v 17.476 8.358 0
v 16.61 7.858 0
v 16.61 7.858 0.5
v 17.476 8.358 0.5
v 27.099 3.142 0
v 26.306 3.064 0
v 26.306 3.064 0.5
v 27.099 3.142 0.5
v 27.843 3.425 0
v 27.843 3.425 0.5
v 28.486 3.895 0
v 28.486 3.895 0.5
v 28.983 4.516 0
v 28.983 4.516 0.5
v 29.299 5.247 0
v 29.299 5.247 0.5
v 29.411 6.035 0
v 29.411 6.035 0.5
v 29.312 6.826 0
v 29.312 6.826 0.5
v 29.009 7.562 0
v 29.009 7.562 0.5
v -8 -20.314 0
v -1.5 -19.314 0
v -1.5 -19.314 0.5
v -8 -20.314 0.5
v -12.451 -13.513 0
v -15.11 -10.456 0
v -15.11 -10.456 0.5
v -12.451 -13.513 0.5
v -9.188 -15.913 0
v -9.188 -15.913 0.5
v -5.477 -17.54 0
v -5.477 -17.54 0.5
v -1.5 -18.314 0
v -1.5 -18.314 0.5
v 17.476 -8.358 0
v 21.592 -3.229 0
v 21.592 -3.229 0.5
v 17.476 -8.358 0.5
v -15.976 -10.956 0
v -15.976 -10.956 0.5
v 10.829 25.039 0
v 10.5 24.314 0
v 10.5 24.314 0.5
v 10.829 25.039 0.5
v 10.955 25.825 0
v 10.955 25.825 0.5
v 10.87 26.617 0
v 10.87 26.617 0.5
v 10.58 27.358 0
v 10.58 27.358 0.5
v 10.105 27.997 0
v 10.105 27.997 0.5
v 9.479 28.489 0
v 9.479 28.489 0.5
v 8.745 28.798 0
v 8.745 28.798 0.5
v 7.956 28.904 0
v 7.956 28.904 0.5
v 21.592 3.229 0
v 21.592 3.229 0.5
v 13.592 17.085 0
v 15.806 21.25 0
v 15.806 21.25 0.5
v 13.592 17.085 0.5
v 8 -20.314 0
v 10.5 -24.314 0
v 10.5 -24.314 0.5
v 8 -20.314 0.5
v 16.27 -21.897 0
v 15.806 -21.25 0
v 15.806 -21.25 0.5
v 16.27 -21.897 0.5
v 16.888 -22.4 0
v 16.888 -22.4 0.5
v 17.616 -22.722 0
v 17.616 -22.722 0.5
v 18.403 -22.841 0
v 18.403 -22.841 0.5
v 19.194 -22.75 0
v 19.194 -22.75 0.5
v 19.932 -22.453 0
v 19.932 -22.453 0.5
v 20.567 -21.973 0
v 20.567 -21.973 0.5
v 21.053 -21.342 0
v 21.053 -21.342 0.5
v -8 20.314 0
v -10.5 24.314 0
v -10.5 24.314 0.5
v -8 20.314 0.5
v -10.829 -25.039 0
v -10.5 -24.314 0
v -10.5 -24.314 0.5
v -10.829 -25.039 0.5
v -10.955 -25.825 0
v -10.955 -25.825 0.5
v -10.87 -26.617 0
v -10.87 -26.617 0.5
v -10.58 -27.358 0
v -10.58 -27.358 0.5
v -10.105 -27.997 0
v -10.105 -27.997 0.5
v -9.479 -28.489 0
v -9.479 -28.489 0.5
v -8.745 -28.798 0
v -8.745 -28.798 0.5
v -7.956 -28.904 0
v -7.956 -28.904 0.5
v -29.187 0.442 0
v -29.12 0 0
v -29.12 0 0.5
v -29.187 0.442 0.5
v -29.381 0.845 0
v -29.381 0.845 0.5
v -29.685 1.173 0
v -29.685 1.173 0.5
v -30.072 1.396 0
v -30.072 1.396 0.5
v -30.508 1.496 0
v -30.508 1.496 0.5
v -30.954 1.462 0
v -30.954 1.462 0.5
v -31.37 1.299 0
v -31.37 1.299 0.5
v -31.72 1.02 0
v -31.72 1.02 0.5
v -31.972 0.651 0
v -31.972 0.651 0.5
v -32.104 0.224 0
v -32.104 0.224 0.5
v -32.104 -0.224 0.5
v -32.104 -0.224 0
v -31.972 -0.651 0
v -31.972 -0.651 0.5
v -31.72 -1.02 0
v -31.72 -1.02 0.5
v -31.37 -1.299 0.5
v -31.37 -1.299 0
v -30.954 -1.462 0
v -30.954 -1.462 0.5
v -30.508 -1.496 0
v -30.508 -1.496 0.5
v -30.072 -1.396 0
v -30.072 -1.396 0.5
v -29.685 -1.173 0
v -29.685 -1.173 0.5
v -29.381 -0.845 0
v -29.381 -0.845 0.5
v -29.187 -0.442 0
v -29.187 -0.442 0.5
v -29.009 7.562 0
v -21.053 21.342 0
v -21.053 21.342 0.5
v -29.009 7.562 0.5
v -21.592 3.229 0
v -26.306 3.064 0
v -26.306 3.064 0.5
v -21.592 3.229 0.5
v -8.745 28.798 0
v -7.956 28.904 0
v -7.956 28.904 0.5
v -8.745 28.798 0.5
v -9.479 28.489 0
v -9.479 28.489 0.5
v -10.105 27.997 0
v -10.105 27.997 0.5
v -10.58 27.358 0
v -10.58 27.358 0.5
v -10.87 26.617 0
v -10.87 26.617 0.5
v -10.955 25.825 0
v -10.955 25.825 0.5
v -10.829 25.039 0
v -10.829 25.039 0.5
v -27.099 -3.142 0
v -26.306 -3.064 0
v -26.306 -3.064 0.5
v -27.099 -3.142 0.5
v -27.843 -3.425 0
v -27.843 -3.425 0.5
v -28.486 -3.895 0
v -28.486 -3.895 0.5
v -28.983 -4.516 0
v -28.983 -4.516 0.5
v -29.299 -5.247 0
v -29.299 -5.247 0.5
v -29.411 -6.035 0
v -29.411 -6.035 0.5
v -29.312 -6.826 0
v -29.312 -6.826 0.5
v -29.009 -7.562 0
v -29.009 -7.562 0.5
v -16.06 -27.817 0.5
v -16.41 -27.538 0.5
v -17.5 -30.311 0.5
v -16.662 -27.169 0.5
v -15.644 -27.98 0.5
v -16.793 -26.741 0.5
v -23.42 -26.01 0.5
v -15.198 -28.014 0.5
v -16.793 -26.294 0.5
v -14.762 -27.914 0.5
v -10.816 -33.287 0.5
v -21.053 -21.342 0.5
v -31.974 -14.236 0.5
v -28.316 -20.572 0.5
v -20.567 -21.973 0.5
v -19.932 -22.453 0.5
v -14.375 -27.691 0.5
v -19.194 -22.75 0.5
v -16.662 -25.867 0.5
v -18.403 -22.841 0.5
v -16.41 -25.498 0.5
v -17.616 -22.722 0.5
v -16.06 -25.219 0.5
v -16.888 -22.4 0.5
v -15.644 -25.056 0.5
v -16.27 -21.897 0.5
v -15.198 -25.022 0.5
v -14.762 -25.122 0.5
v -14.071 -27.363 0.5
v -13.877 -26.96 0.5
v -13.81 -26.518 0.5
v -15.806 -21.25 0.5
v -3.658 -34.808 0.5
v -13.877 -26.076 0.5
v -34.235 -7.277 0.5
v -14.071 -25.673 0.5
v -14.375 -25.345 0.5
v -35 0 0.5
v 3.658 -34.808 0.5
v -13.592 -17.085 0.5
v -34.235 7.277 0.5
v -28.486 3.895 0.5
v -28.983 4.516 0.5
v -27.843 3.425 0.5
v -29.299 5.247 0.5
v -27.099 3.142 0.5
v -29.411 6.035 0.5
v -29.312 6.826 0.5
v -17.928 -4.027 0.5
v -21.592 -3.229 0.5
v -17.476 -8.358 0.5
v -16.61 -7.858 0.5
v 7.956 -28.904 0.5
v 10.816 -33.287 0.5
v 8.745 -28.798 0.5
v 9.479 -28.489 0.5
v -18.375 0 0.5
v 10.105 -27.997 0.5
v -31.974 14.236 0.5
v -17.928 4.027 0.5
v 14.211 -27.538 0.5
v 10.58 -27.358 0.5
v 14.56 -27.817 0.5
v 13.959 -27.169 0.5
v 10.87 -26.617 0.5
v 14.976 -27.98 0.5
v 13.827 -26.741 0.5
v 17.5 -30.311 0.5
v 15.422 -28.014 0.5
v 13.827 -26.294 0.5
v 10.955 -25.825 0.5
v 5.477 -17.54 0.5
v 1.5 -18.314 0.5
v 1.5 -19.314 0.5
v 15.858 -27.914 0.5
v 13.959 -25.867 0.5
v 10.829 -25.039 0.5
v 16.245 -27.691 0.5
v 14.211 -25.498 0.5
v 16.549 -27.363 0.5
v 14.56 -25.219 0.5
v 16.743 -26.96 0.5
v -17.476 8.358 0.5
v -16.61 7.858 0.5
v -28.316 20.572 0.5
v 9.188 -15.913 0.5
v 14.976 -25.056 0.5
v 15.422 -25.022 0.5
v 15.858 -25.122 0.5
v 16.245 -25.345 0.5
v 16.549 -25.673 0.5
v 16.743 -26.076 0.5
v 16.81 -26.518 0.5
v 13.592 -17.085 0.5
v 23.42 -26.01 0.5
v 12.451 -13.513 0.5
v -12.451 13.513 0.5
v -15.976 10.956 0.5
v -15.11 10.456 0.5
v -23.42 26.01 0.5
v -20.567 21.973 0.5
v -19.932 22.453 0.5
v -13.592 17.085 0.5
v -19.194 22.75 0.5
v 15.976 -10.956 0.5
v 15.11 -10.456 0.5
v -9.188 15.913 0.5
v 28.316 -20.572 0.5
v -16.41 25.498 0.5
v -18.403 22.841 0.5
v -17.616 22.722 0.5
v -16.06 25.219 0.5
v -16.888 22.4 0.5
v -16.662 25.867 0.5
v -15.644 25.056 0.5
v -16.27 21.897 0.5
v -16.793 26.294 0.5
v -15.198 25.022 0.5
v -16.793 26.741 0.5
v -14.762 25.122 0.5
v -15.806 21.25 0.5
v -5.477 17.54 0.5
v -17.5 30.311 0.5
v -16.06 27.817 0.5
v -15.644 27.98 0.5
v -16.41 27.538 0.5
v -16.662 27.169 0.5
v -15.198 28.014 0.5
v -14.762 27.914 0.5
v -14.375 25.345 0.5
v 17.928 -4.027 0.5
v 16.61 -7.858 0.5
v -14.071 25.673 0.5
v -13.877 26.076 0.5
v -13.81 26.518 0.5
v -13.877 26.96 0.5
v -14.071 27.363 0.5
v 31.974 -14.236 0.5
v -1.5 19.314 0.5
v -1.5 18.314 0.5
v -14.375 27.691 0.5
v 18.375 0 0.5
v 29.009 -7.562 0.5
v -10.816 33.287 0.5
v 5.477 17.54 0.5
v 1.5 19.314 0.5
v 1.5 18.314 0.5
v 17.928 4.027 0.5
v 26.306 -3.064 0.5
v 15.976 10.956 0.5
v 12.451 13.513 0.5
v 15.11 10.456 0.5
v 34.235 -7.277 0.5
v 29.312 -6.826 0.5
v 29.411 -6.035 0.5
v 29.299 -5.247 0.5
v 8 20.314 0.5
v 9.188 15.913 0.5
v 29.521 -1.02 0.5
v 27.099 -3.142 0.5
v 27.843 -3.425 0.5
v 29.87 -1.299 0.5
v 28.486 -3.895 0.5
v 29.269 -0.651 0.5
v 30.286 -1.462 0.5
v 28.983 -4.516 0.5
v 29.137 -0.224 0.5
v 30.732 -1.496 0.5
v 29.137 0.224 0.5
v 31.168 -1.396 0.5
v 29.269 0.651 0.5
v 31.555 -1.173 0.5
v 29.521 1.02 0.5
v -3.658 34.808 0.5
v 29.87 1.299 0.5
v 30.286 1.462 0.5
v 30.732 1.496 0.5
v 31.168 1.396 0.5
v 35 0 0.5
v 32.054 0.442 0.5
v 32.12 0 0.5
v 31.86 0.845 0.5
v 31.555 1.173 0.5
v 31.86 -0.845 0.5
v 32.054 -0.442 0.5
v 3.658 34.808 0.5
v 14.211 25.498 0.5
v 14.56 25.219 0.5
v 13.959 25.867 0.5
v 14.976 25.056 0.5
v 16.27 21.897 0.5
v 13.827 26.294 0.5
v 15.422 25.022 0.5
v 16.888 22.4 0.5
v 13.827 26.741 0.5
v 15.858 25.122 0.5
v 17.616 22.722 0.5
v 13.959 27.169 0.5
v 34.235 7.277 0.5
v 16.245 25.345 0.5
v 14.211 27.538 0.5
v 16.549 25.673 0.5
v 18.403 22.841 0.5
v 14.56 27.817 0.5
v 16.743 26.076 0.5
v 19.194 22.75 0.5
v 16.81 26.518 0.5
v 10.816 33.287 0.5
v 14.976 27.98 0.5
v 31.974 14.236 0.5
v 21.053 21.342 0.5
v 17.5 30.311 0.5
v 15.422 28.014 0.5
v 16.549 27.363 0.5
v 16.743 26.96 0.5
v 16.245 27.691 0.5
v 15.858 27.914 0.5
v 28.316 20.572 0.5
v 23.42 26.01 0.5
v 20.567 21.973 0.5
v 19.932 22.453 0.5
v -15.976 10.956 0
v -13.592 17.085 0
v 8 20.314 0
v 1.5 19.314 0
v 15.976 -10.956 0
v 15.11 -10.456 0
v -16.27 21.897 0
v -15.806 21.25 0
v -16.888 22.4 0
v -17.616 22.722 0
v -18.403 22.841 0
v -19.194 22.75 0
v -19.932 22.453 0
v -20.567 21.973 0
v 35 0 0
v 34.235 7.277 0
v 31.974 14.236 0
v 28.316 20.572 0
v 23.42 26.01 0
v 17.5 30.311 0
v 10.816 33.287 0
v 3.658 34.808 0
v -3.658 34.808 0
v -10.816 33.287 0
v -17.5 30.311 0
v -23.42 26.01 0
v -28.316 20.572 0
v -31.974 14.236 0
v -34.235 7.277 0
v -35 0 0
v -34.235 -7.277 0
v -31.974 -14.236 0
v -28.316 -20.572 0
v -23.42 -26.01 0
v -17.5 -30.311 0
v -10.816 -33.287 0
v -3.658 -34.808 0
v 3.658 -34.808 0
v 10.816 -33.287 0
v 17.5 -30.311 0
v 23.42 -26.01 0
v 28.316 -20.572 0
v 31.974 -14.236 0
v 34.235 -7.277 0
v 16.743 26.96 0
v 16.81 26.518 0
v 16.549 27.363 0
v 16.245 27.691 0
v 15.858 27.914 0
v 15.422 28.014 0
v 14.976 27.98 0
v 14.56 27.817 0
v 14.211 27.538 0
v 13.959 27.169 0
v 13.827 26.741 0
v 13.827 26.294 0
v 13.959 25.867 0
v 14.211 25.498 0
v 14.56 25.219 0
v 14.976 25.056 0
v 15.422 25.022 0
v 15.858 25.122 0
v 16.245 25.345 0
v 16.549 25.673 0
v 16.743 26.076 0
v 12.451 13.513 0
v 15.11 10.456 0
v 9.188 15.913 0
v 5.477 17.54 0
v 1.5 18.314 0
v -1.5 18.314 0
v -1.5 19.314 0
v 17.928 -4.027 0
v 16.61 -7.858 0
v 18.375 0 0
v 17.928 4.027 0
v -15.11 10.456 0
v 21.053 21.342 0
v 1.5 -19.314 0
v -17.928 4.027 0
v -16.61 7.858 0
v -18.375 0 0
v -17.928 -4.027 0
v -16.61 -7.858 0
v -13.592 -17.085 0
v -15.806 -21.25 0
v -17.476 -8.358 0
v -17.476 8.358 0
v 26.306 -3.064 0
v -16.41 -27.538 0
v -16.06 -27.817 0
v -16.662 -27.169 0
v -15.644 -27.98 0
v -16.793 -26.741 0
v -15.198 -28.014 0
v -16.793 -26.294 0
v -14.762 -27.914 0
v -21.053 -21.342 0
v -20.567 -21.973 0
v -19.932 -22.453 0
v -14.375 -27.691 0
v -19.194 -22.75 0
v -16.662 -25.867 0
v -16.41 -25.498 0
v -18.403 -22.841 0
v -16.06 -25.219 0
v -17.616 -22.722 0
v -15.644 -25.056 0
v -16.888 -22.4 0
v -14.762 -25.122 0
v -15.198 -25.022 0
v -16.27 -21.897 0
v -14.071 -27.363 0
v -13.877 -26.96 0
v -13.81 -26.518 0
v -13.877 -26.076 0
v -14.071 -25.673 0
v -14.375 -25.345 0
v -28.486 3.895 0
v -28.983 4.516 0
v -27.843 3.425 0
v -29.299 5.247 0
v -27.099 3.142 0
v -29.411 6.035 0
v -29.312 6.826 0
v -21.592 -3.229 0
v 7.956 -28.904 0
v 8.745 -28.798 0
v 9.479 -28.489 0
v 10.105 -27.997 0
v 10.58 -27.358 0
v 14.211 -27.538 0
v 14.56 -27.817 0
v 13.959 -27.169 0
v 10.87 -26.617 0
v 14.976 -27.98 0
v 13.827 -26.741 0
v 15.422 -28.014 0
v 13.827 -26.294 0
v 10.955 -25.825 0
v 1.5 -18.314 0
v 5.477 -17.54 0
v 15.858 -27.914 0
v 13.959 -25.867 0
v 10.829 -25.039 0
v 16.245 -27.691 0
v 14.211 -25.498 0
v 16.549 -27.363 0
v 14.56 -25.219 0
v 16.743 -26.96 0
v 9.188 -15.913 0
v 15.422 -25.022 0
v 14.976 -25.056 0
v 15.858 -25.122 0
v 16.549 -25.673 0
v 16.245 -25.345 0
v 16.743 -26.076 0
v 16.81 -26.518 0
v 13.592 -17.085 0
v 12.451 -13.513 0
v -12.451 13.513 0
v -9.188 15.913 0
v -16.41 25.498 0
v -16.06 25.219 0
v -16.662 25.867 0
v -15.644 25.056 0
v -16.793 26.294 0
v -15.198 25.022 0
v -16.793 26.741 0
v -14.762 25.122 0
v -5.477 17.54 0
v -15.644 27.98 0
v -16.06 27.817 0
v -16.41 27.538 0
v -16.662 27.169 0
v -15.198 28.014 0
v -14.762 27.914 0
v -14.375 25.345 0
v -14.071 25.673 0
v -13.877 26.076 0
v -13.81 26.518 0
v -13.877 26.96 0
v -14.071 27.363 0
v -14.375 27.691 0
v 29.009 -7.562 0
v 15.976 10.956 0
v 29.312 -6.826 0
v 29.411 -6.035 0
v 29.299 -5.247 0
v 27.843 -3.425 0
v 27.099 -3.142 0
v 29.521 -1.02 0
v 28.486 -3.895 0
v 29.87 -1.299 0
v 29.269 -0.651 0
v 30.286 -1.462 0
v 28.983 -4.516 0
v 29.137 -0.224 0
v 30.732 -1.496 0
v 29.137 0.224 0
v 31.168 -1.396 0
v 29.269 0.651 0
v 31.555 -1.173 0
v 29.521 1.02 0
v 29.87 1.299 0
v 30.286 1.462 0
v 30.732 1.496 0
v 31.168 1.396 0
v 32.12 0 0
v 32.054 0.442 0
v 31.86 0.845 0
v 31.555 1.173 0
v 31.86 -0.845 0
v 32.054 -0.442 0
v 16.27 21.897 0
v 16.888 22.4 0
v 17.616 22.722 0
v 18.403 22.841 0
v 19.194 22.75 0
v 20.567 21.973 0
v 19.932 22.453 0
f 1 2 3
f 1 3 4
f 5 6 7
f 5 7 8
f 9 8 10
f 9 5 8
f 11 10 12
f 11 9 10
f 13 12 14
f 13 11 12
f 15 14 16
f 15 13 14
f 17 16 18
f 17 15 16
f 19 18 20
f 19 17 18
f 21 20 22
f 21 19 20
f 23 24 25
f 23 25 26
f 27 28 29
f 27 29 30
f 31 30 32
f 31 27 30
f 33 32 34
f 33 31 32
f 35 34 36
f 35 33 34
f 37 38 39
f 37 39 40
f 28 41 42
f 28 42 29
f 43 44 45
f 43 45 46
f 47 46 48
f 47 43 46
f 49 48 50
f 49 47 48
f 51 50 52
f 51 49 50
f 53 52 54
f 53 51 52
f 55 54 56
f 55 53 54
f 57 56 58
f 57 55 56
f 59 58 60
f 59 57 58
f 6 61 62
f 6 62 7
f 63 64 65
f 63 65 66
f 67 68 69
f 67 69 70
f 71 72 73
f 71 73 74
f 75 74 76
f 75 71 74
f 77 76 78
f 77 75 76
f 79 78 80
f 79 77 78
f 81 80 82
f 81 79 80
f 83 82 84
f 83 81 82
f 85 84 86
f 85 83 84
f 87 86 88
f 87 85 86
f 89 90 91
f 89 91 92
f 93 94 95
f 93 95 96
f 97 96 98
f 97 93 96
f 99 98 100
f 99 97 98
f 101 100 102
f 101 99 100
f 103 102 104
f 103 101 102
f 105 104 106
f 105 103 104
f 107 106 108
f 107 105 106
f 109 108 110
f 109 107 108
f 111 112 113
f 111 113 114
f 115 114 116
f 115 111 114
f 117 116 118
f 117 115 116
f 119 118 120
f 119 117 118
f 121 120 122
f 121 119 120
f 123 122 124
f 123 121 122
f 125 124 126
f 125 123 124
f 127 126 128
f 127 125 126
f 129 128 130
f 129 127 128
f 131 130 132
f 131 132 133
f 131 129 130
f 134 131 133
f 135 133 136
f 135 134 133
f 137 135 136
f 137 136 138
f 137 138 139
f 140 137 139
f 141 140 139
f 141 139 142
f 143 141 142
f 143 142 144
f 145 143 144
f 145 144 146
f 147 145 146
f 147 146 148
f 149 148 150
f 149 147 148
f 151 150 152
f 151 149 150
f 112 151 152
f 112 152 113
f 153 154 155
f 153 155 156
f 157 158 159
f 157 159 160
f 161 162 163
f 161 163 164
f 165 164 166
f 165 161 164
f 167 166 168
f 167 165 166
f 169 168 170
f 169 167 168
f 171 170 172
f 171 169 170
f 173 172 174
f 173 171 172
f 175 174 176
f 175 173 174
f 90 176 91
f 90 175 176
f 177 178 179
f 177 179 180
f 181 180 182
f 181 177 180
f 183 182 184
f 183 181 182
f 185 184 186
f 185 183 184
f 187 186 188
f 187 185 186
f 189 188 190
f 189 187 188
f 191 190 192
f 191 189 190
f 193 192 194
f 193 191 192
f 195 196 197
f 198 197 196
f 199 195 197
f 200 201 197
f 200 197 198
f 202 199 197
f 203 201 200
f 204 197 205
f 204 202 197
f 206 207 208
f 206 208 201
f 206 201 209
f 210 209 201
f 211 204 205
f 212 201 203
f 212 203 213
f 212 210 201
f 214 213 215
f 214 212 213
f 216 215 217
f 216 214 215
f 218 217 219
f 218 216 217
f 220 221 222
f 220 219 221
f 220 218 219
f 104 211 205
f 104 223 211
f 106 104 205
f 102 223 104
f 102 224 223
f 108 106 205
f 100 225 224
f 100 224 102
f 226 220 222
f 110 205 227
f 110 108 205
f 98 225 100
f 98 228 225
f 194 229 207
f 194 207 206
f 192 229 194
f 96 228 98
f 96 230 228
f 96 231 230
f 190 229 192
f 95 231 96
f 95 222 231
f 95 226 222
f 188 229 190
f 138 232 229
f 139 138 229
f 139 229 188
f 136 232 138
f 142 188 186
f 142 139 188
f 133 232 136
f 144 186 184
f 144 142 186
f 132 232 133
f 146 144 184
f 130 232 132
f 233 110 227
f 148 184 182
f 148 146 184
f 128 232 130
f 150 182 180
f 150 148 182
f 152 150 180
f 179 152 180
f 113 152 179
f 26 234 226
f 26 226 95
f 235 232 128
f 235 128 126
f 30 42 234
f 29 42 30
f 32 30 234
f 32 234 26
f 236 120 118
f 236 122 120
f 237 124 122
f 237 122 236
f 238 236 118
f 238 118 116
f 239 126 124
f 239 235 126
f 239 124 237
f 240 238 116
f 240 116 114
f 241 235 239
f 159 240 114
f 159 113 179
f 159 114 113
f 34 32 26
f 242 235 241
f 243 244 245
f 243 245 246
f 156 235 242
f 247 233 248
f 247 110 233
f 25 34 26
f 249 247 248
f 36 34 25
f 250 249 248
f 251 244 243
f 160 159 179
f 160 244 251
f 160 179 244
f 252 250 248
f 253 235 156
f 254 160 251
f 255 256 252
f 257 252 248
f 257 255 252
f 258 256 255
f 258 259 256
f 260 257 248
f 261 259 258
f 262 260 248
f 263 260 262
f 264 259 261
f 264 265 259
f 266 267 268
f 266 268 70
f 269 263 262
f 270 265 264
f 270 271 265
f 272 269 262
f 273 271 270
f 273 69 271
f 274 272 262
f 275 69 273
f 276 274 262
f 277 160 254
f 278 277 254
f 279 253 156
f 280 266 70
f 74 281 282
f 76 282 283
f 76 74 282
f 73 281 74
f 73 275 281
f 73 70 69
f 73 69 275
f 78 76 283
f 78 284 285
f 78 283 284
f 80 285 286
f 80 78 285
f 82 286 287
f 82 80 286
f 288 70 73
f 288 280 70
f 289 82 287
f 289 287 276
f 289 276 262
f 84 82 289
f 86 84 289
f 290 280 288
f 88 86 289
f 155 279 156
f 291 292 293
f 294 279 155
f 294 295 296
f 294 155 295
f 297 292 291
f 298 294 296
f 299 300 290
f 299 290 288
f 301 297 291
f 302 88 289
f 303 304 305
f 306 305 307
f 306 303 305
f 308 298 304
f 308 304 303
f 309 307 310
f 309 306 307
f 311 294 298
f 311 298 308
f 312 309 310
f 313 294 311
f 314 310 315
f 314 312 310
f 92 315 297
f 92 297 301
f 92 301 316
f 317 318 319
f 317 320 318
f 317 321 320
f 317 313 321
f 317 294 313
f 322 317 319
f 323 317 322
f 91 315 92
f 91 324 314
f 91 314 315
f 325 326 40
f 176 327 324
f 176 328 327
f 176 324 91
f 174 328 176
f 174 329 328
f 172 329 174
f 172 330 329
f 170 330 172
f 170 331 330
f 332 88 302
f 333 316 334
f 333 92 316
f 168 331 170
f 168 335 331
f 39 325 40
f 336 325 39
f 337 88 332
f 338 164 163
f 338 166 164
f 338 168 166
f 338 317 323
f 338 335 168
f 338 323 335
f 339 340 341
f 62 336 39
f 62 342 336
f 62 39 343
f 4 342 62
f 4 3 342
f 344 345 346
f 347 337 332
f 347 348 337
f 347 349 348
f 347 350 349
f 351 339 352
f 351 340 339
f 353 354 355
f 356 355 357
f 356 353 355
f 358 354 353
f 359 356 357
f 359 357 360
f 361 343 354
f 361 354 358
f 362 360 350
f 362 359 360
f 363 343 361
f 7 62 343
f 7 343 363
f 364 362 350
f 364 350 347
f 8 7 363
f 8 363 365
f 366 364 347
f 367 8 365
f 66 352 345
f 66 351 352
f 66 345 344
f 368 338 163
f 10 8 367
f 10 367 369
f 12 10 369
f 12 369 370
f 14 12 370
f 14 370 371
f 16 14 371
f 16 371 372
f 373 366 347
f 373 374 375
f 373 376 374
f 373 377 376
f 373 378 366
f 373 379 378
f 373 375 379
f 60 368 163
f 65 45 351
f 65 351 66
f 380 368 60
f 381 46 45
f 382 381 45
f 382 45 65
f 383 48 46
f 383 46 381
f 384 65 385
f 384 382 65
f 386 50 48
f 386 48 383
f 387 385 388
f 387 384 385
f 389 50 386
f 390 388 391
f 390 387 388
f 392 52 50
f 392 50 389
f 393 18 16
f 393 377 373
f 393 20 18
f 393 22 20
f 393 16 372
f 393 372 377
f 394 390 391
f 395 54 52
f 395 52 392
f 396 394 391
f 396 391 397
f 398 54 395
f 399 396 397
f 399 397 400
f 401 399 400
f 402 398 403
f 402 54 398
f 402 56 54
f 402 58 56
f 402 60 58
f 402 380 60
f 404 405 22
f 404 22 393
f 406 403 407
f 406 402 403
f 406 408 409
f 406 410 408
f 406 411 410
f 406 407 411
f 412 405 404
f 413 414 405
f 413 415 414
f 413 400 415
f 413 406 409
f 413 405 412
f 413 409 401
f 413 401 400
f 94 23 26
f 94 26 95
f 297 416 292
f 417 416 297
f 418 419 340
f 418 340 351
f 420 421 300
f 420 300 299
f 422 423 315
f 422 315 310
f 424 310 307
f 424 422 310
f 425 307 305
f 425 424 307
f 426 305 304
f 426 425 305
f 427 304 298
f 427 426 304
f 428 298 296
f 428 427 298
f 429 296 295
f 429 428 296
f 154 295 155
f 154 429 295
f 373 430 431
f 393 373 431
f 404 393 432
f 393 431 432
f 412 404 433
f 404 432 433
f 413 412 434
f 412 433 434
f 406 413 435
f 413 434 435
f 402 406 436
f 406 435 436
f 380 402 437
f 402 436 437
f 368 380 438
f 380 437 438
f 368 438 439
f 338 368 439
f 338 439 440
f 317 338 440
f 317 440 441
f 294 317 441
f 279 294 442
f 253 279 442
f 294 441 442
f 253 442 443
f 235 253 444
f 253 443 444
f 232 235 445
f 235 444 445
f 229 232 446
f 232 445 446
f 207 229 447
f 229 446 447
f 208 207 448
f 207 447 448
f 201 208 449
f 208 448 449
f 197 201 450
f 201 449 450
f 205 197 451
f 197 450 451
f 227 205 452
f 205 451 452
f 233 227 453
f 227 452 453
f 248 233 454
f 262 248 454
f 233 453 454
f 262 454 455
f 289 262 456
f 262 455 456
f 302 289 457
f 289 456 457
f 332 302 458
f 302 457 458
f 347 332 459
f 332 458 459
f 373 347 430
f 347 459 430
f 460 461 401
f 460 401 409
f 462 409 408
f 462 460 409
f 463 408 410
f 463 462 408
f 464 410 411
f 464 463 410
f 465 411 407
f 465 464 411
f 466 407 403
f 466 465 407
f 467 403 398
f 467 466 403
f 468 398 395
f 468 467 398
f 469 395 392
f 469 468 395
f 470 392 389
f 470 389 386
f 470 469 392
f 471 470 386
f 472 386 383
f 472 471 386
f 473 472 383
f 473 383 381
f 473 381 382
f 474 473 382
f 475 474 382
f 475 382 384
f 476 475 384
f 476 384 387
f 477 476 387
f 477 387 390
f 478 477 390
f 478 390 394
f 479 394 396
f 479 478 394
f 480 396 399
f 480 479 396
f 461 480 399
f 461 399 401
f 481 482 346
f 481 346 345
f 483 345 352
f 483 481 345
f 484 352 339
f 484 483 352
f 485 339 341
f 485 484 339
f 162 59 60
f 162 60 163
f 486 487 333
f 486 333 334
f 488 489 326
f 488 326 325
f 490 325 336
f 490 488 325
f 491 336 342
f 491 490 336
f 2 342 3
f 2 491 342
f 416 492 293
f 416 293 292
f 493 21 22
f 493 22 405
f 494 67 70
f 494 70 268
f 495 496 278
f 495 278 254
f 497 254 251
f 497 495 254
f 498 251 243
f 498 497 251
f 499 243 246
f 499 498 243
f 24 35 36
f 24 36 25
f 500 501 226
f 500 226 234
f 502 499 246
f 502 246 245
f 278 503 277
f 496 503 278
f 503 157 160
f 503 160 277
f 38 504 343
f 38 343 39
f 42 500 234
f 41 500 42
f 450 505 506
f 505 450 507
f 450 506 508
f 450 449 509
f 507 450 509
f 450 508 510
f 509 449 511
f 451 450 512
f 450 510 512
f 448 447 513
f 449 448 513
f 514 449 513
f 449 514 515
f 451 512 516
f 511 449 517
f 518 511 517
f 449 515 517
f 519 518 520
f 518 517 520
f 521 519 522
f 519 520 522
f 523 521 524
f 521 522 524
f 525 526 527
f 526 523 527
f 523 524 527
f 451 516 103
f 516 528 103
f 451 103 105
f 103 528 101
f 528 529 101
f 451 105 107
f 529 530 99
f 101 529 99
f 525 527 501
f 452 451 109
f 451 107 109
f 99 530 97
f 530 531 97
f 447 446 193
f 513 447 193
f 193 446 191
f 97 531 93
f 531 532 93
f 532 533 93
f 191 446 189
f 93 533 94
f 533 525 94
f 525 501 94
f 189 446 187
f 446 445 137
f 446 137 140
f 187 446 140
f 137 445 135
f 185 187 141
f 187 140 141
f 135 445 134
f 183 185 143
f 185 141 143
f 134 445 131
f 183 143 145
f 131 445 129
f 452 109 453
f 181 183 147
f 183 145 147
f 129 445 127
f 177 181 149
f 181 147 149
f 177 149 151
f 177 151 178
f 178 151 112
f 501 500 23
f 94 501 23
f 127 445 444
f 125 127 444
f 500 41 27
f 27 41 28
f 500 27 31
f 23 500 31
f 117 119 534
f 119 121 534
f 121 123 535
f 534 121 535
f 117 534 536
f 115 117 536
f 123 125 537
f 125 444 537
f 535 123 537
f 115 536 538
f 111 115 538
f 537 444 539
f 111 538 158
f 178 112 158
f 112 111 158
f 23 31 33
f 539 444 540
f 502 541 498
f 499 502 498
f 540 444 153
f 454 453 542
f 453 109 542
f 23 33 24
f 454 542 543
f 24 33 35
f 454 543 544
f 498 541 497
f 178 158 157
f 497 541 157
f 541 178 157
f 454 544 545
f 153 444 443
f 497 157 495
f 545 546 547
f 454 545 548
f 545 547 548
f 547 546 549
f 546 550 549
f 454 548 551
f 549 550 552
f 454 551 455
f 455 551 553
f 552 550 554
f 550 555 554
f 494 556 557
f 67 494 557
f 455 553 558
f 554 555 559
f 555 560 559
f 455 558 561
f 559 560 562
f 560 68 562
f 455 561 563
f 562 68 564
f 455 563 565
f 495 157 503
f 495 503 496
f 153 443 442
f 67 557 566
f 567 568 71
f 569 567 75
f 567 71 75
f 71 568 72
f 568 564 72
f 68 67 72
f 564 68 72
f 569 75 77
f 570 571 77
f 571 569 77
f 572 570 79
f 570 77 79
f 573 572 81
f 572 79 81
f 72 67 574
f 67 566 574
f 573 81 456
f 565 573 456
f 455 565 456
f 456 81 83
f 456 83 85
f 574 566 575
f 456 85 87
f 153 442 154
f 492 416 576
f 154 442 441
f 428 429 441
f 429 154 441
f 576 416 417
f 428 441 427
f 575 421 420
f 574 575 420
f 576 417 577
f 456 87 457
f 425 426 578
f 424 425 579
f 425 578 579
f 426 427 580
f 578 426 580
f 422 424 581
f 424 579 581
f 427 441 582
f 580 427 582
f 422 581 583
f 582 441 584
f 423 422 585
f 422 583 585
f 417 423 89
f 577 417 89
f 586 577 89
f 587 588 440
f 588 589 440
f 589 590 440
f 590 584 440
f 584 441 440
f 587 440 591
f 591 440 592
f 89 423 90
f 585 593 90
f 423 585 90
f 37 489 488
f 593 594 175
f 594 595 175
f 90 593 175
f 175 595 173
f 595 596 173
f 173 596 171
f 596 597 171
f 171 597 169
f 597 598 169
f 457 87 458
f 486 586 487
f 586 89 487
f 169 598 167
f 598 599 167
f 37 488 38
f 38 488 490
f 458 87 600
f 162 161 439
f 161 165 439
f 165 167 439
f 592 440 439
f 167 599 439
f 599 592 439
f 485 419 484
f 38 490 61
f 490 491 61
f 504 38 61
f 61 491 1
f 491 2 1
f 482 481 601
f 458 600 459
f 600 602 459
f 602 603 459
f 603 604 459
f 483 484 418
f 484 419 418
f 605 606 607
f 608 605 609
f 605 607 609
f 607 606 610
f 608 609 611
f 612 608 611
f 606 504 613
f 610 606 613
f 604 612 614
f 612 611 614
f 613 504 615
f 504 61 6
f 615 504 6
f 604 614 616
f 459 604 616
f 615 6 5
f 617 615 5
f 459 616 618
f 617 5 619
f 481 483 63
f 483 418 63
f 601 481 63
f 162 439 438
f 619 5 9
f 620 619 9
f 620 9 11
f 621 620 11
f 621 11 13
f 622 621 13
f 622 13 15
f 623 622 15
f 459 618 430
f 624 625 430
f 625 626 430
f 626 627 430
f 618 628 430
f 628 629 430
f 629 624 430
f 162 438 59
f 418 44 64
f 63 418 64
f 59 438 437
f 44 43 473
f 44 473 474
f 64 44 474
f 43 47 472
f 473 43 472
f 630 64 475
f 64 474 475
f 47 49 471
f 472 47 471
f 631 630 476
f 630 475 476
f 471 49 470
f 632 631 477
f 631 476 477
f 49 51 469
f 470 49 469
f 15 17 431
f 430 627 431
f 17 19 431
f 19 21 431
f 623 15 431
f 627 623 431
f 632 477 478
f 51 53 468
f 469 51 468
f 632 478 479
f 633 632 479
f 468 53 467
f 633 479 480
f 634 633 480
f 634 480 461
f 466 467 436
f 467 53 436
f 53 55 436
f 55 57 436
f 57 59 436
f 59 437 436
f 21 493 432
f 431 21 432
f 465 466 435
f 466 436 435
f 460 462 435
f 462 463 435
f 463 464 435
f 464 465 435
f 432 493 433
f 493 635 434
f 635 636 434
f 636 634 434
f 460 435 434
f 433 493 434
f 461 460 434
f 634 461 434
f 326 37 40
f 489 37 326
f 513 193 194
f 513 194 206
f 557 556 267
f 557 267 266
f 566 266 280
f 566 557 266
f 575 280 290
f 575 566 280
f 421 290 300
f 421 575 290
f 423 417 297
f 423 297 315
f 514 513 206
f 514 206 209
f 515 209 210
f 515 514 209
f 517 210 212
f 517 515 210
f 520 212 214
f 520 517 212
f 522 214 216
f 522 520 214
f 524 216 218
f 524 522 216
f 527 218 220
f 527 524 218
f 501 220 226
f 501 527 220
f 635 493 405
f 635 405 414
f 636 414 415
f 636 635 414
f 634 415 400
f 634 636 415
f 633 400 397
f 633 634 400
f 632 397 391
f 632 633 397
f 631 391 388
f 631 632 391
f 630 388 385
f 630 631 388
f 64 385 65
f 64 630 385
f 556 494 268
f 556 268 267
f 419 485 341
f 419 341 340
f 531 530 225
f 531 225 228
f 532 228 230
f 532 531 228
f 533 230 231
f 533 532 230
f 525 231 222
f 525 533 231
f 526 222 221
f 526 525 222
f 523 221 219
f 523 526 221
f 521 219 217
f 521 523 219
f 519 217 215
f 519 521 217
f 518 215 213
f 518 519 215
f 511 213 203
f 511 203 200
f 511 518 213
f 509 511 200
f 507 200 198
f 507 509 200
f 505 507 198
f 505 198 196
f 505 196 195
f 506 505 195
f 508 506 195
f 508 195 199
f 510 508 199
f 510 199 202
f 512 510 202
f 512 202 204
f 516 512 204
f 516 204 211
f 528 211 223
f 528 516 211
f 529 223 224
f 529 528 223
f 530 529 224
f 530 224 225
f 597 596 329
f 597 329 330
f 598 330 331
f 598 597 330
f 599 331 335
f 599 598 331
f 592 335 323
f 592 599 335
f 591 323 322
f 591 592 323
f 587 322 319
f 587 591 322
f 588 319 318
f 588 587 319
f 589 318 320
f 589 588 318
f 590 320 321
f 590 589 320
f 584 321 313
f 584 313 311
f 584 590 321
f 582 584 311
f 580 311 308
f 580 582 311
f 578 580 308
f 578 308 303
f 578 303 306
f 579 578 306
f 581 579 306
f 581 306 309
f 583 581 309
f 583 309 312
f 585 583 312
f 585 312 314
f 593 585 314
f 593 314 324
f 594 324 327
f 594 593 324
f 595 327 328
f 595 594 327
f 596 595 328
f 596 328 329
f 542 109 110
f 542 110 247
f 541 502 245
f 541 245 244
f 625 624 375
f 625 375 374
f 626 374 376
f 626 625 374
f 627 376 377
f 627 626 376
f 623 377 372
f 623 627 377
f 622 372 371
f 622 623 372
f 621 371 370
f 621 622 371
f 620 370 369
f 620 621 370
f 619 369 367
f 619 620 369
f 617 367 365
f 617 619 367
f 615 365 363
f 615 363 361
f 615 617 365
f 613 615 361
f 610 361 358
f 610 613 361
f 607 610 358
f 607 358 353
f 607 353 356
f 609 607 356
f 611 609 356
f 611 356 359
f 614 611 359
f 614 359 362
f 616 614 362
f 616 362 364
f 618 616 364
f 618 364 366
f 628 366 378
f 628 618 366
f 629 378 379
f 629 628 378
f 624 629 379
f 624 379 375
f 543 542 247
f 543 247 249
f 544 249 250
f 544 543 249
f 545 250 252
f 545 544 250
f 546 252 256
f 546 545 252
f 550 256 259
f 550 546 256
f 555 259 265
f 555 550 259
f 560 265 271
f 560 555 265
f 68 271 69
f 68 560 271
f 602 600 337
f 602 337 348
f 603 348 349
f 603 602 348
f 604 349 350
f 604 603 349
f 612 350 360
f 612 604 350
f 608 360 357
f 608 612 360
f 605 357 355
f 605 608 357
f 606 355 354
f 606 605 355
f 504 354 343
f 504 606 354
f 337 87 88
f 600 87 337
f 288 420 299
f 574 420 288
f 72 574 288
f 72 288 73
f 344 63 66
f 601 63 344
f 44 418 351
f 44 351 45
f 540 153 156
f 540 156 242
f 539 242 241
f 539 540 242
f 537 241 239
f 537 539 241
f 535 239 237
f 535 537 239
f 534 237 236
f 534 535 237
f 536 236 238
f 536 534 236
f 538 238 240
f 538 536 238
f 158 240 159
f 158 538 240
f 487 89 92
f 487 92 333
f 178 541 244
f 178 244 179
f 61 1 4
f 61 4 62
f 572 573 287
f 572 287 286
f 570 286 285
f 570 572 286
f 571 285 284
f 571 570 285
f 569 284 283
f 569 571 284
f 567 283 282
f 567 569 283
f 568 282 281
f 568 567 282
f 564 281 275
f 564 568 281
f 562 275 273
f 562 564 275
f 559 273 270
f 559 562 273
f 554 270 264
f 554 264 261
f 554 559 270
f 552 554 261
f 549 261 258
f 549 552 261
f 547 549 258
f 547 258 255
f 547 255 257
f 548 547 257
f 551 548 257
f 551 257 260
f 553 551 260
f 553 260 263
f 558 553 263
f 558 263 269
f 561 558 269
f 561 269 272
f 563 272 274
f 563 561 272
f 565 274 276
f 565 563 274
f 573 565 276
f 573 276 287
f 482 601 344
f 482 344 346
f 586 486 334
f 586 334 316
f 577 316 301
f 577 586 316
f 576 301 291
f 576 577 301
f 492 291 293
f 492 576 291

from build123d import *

# Parameters (mm, degrees)
IZIM2_R                     = 35
IZIM2_R_2                   = 1.5
Y_KSEKLIK_EKSTR_ZYON1_DEPTH = 0.5


with BuildPart() as part:
    # Çizim2 → Yükseklik-Ekstrüzyon1 (new body)
    with BuildSketch(Plane.XY):
        Circle(IZIM2_R)
        with Locations((-15.31013221, -26.517926859)):
            Circle(IZIM2_R_2, mode=Mode.SUBTRACT)
        with Locations((30.62026442, 0)):
            Circle(IZIM2_R_2, mode=Mode.SUBTRACT)
        with Locations((-15.31013221, 26.517926859)):
            Circle(IZIM2_R_2, mode=Mode.SUBTRACT)
        with Locations((15.31013221, 26.517926859)):
            Circle(IZIM2_R_2, mode=Mode.SUBTRACT)
        with Locations((15.31013221, -26.517926859)):
            Circle(IZIM2_R_2, mode=Mode.SUBTRACT)
        with Locations((-30.62026442, 0)):
            Circle(IZIM2_R_2, mode=Mode.SUBTRACT)
        with BuildLine():
            Line((-15.110106202, 10.455874691), (-15.976131606, 10.955874691))
            Line((-15.976131606, 10.955874691), (-13.59215701, 17.085039816))
            Line((-13.59215701, 17.085039816), (-15.806258625, 21.250103325))
            ThreePointArc((-15.806258625, 21.250103325), (-18.402735589, 22.841478137), (-21.05330993, 21.341937514))
            Line((-21.05330993, 21.341937514), (-29.009315019, 7.561732477))
            ThreePointArc((-29.009315019, 7.561732477), (-28.982668121, 4.516497451), (-26.306258625, 3.063569846))
            Line((-26.306258625, 3.063569846), (-21.59215701, 3.228633355))
            Line((-21.59215701, 3.228633355), (-17.476131606, 8.35779848))
            Line((-17.476131606, 8.35779848), (-16.610106202, 7.85779848))
            ThreePointArc((-16.610106202, 7.85779848), (-18.375, 0), (-16.610106202, -7.85779848))
            Line((-16.610106202, -7.85779848), (-17.476131606, -8.35779848))
            Line((-17.476131606, -8.35779848), (-21.59215701, -3.228633355))
            Line((-21.59215701, -3.228633355), (-26.306258625, -3.063569846))
            ThreePointArc((-26.306258625, -3.063569846), (-28.982668121, -4.516497451), (-29.009315018, -7.561732476))
            Line((-29.009315018, -7.561732476), (-21.05330993, -21.341937514))
            ThreePointArc((-21.05330993, -21.341937514), (-18.402735589, -22.841478137), (-15.806258625, -21.250103325))
            Line((-15.806258625, -21.250103325), (-13.59215701, -17.085039816))
            Line((-13.59215701, -17.085039816), (-15.976131606, -10.955874691))
            Line((-15.976131606, -10.955874691), (-15.110106202, -10.455874691))
            ThreePointArc((-15.110106202, -10.455874691), (-9.1875, -15.913216795), (-1.5, -18.313673171))
            Line((-1.5, -18.313673171), (-1.5, -19.313673171))
            Line((-1.5, -19.313673171), (-8, -20.313673171))
            Line((-8, -20.313673171), (-10.5, -24.313673171))
            ThreePointArc((-10.5, -24.313673171), (-10.579932532, -27.357975588), (-7.956005088, -28.903669991))
            Line((-7.956005088, -28.903669991), (7.956005088, -28.903669991))
            ThreePointArc((7.956005088, -28.903669991), (10.579932532, -27.357975588), (10.5, -24.313673171))
            Line((10.5, -24.313673171), (8, -20.313673171))
            Line((8, -20.313673171), (1.5, -19.313673171))
            Line((1.5, -19.313673171), (1.5, -18.313673171))
            ThreePointArc((1.5, -18.313673171), (9.1875, -15.913216795), (15.110106202, -10.455874691))
            Line((15.110106202, -10.455874691), (15.976131606, -10.955874691))
            Line((15.976131606, -10.955874691), (13.59215701, -17.085039816))
            Line((13.59215701, -17.085039816), (15.806258625, -21.250103325))
            ThreePointArc((15.806258625, -21.250103325), (18.402735589, -22.841478137), (21.05330993, -21.341937514))
            Line((21.05330993, -21.341937514), (29.009315019, -7.561732476))
            ThreePointArc((29.009315019, -7.561732476), (28.982668121, -4.516497451), (26.306258625, -3.063569846))
            Line((26.306258625, -3.063569846), (21.59215701, -3.228633355))
            Line((21.59215701, -3.228633355), (17.476131606, -8.35779848))
            Line((17.476131606, -8.35779848), (16.610106202, -7.85779848))
            ThreePointArc((16.610106202, -7.85779848), (18.375, 0), (16.610106202, 7.85779848))
            Line((16.610106202, 7.85779848), (17.476131606, 8.35779848))
            Line((17.476131606, 8.35779848), (21.59215701, 3.228633355))
            Line((21.59215701, 3.228633355), (26.306258625, 3.063569846))
            ThreePointArc((26.306258625, 3.063569846), (28.982668121, 4.516497451), (29.009315018, 7.561732476))
            Line((29.009315018, 7.561732476), (21.05330993, 21.341937514))
            ThreePointArc((21.05330993, 21.341937514), (18.402735589, 22.841478137), (15.806258625, 21.250103325))
            Line((15.806258625, 21.250103325), (13.59215701, 17.085039816))
            Line((13.59215701, 17.085039816), (15.976131606, 10.955874691))
            Line((15.976131606, 10.955874691), (15.110106202, 10.455874691))
            ThreePointArc((15.110106202, 10.455874691), (9.1875, 15.913216795), (1.5, 18.313673171))
            Line((1.5, 18.313673171), (1.5, 19.313673171))
            Line((1.5, 19.313673171), (8, 20.313673171))
            Line((8, 20.313673171), (10.5, 24.313673171))
            ThreePointArc((10.5, 24.313673171), (10.579932532, 27.357975588), (7.956005088, 28.903669991))
            Line((7.956005088, 28.903669991), (-7.956005088, 28.903669991))
            ThreePointArc((-7.956005088, 28.903669991), (-10.579932532, 27.357975588), (-10.5, 24.313673171))
            Line((-10.5, 24.313673171), (-8, 20.313673171))
            Line((-8, 20.313673171), (-1.5, 19.313673171))
            Line((-1.5, 19.313673171), (-1.5, 18.313673171))
            ThreePointArc((-1.5, 18.313673171), (-9.1875, 15.913216795), (-15.110106202, 10.455874691))
        make_face(mode=Mode.SUBTRACT)
    extrude(amount=Y_KSEKLIK_EKSTR_ZYON1_DEPTH)


solid = part.part
